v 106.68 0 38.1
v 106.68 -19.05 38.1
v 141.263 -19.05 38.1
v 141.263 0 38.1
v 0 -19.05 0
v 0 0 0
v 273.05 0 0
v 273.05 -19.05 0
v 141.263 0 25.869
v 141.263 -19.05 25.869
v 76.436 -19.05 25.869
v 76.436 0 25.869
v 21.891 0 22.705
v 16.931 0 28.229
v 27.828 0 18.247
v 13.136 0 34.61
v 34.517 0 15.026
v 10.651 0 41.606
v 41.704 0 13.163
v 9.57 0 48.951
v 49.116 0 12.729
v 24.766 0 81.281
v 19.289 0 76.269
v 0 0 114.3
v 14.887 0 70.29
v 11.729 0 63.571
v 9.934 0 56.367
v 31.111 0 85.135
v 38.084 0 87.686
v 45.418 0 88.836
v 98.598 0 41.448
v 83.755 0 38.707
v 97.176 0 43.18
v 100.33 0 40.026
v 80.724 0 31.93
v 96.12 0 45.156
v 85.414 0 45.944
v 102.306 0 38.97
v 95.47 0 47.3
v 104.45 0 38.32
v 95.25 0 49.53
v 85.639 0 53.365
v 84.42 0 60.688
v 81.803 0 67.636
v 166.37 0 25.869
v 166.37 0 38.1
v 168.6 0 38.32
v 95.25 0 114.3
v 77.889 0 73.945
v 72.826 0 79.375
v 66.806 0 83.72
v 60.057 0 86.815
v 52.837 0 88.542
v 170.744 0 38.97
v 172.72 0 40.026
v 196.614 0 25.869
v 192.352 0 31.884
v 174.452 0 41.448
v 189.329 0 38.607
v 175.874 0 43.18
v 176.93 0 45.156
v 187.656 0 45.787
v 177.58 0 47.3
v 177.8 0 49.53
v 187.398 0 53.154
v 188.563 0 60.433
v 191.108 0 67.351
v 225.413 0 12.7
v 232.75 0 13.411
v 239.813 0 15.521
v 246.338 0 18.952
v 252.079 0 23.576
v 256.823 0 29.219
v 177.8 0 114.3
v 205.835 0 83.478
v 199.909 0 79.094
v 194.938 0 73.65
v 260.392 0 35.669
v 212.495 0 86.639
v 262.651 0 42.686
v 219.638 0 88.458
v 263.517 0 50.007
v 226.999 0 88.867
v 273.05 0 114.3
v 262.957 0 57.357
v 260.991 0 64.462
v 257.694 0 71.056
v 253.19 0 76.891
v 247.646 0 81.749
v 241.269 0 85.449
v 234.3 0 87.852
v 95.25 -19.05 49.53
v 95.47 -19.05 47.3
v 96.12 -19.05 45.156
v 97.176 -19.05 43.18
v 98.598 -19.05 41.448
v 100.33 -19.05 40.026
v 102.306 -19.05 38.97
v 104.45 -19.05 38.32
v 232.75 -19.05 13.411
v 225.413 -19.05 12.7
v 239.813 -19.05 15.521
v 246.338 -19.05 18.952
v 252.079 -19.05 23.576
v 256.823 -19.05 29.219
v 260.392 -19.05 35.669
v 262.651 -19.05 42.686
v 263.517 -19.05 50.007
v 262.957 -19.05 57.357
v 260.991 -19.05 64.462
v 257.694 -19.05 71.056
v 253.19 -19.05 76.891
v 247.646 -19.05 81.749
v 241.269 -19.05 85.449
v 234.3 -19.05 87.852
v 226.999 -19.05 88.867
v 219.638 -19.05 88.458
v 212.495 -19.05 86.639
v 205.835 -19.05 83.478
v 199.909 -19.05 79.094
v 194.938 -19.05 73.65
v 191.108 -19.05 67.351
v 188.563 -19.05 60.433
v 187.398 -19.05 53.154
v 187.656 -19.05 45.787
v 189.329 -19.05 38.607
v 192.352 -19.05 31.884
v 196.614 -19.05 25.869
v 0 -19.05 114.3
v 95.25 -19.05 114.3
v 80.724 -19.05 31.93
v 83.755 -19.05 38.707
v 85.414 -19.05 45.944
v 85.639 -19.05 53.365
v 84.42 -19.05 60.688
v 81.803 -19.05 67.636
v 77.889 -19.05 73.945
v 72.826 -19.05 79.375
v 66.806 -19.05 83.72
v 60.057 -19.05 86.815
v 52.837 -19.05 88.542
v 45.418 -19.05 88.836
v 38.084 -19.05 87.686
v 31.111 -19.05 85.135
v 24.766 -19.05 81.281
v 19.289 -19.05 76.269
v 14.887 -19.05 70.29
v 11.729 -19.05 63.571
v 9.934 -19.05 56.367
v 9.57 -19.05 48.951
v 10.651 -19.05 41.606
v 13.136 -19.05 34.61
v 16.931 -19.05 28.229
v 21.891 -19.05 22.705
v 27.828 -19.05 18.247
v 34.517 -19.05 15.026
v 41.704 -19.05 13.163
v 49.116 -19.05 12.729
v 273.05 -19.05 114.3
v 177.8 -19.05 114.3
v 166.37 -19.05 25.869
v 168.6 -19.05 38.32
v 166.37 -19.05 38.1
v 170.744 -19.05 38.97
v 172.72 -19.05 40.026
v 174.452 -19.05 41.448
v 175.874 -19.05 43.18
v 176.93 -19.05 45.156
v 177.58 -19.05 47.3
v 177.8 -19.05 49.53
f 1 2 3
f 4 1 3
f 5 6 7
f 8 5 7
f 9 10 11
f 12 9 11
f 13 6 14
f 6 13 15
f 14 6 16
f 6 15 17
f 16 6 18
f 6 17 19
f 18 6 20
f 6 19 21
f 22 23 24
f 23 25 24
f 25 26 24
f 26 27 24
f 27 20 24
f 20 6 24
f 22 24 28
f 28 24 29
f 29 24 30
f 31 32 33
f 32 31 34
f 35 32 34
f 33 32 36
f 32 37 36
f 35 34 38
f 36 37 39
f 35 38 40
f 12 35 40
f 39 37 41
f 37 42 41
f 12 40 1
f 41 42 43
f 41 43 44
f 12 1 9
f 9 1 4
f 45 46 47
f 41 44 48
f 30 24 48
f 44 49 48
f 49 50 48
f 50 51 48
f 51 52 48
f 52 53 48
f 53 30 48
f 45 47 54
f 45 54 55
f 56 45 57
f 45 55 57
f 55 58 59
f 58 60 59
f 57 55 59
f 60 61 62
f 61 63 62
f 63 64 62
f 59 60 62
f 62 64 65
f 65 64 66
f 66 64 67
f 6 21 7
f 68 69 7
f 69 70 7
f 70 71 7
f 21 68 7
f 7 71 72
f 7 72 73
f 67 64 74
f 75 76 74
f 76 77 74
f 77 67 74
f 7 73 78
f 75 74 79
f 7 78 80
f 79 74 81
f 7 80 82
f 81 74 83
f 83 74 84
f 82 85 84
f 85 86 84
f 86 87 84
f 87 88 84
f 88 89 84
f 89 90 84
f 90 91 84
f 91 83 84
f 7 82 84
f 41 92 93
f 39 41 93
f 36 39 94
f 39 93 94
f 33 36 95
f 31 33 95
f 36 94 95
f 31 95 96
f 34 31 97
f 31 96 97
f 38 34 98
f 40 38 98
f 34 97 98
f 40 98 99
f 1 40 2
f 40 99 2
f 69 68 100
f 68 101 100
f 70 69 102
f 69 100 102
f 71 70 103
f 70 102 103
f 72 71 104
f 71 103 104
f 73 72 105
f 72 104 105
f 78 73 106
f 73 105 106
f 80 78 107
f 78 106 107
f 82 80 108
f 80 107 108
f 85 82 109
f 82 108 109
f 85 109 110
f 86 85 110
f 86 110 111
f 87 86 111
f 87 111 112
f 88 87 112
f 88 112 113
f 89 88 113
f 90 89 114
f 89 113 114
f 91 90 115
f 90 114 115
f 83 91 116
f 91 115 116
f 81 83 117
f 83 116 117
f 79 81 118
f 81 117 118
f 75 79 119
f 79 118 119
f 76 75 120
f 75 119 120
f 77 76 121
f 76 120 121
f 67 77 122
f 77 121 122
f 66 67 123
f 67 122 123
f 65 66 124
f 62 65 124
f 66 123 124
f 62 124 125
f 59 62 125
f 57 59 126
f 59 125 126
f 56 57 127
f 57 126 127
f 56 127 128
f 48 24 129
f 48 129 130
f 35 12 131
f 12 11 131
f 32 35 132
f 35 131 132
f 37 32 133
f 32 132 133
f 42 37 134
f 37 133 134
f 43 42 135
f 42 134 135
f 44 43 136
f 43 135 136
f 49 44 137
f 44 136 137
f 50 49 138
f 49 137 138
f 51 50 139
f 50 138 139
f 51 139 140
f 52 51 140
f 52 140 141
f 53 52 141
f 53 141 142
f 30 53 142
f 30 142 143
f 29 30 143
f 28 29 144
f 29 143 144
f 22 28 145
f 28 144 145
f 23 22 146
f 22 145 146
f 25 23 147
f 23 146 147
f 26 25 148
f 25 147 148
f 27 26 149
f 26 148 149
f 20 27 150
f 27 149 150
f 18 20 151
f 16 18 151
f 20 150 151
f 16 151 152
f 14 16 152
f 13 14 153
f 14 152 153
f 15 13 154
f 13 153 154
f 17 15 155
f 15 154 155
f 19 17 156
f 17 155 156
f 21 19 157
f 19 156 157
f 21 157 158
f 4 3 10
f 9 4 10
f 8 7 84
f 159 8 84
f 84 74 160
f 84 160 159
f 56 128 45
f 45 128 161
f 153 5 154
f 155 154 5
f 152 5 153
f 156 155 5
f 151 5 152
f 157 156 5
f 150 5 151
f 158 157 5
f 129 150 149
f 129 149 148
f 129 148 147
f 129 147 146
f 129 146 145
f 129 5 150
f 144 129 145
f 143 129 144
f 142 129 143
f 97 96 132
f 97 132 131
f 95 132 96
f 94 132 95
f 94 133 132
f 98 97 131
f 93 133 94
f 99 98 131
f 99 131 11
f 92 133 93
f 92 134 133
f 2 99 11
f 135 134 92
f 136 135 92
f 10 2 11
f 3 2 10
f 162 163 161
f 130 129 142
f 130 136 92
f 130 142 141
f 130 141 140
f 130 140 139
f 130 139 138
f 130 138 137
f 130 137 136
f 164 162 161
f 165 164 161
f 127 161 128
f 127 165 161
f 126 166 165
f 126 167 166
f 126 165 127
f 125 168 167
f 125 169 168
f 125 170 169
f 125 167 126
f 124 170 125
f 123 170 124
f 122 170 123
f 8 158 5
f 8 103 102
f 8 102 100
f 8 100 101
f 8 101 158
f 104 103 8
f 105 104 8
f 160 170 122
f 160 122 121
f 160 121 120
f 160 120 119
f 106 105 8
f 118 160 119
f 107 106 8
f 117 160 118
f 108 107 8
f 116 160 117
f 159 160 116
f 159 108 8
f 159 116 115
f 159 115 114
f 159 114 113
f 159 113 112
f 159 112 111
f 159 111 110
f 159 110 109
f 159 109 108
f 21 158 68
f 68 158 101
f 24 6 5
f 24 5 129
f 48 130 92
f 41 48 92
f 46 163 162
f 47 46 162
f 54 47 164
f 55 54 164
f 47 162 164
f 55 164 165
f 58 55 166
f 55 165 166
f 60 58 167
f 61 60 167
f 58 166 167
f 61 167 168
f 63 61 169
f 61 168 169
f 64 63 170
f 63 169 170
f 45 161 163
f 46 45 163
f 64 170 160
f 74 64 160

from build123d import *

# Parameters (mm, degrees)
F0_W     = 273.05
F0_H     = 114.3
F1_DEPTH = 19.05
F2_R     = 38.1
F3_DEPTH = 25.4
F5_DEPTH = 25.4
F7_DEPTH = 25.4


with BuildPart() as f1:
    # F0 (on Front) → F1 (new body)
    with BuildSketch(Plane.XZ):
        with Locations((136.525, 57.15)):
            Rectangle(F0_W, F0_H)
    extrude(amount=F1_DEPTH)

    # F2 (on face) → F3 (cut)
    with BuildSketch(Plane.XZ.offset(19.05)):
        with Locations((47.625, 50.8)):
            Circle(F2_R)
        with Locations((225.425, 50.8)):
            Circle(F2_R)
    extrude(amount=-F3_DEPTH, mode=Mode.SUBTRACT)

    # F4 (on face) → F5 (cut)
    with BuildSketch(Plane.XZ.offset(19.05)):
        with BuildLine():
            Line((177.8, 114.3), (95.25, 114.3))
            Line((95.25, 114.3), (95.25, 49.53))
            ThreePointArc((95.25, 49.53), (98.597769, 41.447769), (106.68, 38.1))
            Line((106.68, 38.1), (166.37, 38.1))
            ThreePointArc((166.37, 38.1), (174.452231, 41.447769), (177.8, 49.53))
            Line((177.8, 49.53), (177.8, 114.3))
        make_face()
    extrude(amount=-F5_DEPTH, mode=Mode.SUBTRACT)

    # F6 (on face) → F7 (cut)
    with BuildSketch(Plane.XZ.offset(19.05)):
        Polygon((166.37, 25.869032), (166.37, 38.1), (141.262531, 38.1), (141.262531, 25.869032), (76.435707, 25.869032), (46.121879, 12.729662), (225.418697, 12.700001), (196.614293, 25.869032), align=None)
    extrude(amount=-F7_DEPTH, mode=Mode.SUBTRACT)


solid = f1.part
